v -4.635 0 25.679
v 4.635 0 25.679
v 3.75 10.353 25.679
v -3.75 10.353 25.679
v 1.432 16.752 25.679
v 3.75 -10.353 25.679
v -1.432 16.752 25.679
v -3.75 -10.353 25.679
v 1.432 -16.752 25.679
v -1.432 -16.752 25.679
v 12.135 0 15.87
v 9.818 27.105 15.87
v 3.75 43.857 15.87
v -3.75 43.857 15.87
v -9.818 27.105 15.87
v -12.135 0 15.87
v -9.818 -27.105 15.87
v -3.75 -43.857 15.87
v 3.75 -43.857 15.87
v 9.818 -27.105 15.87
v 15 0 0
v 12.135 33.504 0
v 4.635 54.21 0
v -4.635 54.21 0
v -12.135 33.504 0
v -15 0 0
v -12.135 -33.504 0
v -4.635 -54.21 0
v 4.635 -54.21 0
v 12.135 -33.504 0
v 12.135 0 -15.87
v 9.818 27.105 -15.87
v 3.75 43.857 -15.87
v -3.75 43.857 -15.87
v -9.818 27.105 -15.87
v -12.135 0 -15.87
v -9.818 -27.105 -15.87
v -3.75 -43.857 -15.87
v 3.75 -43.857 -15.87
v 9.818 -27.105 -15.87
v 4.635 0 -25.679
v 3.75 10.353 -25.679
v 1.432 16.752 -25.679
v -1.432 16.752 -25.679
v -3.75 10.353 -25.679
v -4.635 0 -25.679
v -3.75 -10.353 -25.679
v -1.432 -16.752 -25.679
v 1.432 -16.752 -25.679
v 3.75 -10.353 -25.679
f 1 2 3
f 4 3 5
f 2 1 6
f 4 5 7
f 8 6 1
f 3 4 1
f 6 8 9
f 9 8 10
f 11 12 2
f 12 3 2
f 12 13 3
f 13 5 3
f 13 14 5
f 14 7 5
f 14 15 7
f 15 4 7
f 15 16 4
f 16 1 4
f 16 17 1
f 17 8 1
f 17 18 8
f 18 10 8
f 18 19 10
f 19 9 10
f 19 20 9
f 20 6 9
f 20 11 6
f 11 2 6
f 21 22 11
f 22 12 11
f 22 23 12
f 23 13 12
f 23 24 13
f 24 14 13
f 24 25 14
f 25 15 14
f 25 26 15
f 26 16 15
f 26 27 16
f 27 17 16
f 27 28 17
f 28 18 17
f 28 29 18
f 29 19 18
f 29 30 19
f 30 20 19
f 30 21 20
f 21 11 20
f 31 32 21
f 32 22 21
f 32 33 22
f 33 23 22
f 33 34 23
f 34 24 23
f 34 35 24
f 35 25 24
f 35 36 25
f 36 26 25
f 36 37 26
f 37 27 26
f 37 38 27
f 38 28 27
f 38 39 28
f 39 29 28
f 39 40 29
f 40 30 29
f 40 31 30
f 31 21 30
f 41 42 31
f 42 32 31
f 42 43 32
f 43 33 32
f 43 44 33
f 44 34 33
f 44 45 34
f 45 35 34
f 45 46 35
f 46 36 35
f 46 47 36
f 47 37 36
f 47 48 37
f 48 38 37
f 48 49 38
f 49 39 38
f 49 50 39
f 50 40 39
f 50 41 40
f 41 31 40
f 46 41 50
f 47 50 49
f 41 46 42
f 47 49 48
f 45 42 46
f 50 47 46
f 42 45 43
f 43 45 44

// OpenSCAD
// Generated by SolidPython 1.0.1 on 2020-07-29 00:46:47


scale(v = [5, 19, 9]) {
	sphere(r = 3);
}
/***********************************************
*********      SolidPython code:      **********
************************************************
 
# import packages: SolidPython
from solid import *
from solid.utils import *
from itertools import chain, combinations, permutations


class Resize:

    def __init__(self, scad_file):
        self.scad_file = scad_file
        #self.scad_file = import_scad(scad_file)
        # cone/cylinder param:
        self.r1 = 0
        self.r2 = 0
        self.h = 0
        # rectangular prism param:
        self.w = 0
        self.l = 0
        # ellipse param:
        self.r = 0

    # import OpenScad code (file name corresponds to shape)


    # classify shape + parameters
    def assign(self, param1, param2, param3):
        if self.scad_file == 'cone.scad':
            self.r1 = param1
            self.r2 = param2
            self.h = param3
        elif self.scad_file == 'cylinder.scad':
            self.r1 = param1
            self.r2 = param2
            self.h = param3
        elif self.scad_file == 'rectangularPrism.scad':
            self.h = param1
            self.l = param2
            self.w = param3
        else:
            self.r = param1
            self.h = param2

    # resize parameters
    def iterate(self):
        x = range(3, 20, 2)
        i = 1
        if self.scad_file == 'cone.scad':
            tempList = list(permutations(x, 2))
            for temp in tempList:
                param1 = temp[0]
                param2 = temp[1]
                filepath = 'produced_scad_files/' + 'cone' + str(param1) + '_' + str(param2) + '_' + '.scad'
                scad_render_to_file(cylinder(h=param1, r1=param2, r2=0), filepath)

        elif self.scad_file == 'cylinder.scad':
            tempList = list(permutations(x, 3))
            for temp in tempList:
                param1 = temp[0]
                param2 = temp[1]
                filepath = 'produced_scad_files/' + 'cylinder' + str(param1) + '_' + str(param2) + '_' + '.scad'
                scad_render_to_file(cylinder(h=param1, r1=param2, r2=param2), filepath)

        elif self.scad_file == 'rectangularPrism.scad':
            tempList = list(permutations(x, 3))
            for temp in tempList:
                param1 = temp[0]
                param2 = temp[1]
                param3 = temp[2]
                filepath = 'produced_scad_files/' + 'rectangularPrism' + str(param1) + '_' + str(param2) + '_' + str(
                    param3) + '.scad'
                scad_render_to_file(cube(size=(param1, param2, param3)), filepath)

        elif self.scad_file == 'ellipse.scad':
            tempList = list(permutations(x, 4))
            for temp in tempList:
                param1 = temp[0]
                param2 = temp[1]
                param3 = temp[2]
                param4 = temp[3]
                filepath = 'produced_scad_files/' + 'ellipse' + str(param1) + '_' + str(param2) + '_' + str(param3) + '_' + str(param4) + '.scad'
                scad_render_to_file(scale([param1, param2, param3])(sphere(r=param4)), filepath)

    def render_to_scadfile(self):
        scad_render_to_file(scad, 'example.scad') 
 
************************************************/
